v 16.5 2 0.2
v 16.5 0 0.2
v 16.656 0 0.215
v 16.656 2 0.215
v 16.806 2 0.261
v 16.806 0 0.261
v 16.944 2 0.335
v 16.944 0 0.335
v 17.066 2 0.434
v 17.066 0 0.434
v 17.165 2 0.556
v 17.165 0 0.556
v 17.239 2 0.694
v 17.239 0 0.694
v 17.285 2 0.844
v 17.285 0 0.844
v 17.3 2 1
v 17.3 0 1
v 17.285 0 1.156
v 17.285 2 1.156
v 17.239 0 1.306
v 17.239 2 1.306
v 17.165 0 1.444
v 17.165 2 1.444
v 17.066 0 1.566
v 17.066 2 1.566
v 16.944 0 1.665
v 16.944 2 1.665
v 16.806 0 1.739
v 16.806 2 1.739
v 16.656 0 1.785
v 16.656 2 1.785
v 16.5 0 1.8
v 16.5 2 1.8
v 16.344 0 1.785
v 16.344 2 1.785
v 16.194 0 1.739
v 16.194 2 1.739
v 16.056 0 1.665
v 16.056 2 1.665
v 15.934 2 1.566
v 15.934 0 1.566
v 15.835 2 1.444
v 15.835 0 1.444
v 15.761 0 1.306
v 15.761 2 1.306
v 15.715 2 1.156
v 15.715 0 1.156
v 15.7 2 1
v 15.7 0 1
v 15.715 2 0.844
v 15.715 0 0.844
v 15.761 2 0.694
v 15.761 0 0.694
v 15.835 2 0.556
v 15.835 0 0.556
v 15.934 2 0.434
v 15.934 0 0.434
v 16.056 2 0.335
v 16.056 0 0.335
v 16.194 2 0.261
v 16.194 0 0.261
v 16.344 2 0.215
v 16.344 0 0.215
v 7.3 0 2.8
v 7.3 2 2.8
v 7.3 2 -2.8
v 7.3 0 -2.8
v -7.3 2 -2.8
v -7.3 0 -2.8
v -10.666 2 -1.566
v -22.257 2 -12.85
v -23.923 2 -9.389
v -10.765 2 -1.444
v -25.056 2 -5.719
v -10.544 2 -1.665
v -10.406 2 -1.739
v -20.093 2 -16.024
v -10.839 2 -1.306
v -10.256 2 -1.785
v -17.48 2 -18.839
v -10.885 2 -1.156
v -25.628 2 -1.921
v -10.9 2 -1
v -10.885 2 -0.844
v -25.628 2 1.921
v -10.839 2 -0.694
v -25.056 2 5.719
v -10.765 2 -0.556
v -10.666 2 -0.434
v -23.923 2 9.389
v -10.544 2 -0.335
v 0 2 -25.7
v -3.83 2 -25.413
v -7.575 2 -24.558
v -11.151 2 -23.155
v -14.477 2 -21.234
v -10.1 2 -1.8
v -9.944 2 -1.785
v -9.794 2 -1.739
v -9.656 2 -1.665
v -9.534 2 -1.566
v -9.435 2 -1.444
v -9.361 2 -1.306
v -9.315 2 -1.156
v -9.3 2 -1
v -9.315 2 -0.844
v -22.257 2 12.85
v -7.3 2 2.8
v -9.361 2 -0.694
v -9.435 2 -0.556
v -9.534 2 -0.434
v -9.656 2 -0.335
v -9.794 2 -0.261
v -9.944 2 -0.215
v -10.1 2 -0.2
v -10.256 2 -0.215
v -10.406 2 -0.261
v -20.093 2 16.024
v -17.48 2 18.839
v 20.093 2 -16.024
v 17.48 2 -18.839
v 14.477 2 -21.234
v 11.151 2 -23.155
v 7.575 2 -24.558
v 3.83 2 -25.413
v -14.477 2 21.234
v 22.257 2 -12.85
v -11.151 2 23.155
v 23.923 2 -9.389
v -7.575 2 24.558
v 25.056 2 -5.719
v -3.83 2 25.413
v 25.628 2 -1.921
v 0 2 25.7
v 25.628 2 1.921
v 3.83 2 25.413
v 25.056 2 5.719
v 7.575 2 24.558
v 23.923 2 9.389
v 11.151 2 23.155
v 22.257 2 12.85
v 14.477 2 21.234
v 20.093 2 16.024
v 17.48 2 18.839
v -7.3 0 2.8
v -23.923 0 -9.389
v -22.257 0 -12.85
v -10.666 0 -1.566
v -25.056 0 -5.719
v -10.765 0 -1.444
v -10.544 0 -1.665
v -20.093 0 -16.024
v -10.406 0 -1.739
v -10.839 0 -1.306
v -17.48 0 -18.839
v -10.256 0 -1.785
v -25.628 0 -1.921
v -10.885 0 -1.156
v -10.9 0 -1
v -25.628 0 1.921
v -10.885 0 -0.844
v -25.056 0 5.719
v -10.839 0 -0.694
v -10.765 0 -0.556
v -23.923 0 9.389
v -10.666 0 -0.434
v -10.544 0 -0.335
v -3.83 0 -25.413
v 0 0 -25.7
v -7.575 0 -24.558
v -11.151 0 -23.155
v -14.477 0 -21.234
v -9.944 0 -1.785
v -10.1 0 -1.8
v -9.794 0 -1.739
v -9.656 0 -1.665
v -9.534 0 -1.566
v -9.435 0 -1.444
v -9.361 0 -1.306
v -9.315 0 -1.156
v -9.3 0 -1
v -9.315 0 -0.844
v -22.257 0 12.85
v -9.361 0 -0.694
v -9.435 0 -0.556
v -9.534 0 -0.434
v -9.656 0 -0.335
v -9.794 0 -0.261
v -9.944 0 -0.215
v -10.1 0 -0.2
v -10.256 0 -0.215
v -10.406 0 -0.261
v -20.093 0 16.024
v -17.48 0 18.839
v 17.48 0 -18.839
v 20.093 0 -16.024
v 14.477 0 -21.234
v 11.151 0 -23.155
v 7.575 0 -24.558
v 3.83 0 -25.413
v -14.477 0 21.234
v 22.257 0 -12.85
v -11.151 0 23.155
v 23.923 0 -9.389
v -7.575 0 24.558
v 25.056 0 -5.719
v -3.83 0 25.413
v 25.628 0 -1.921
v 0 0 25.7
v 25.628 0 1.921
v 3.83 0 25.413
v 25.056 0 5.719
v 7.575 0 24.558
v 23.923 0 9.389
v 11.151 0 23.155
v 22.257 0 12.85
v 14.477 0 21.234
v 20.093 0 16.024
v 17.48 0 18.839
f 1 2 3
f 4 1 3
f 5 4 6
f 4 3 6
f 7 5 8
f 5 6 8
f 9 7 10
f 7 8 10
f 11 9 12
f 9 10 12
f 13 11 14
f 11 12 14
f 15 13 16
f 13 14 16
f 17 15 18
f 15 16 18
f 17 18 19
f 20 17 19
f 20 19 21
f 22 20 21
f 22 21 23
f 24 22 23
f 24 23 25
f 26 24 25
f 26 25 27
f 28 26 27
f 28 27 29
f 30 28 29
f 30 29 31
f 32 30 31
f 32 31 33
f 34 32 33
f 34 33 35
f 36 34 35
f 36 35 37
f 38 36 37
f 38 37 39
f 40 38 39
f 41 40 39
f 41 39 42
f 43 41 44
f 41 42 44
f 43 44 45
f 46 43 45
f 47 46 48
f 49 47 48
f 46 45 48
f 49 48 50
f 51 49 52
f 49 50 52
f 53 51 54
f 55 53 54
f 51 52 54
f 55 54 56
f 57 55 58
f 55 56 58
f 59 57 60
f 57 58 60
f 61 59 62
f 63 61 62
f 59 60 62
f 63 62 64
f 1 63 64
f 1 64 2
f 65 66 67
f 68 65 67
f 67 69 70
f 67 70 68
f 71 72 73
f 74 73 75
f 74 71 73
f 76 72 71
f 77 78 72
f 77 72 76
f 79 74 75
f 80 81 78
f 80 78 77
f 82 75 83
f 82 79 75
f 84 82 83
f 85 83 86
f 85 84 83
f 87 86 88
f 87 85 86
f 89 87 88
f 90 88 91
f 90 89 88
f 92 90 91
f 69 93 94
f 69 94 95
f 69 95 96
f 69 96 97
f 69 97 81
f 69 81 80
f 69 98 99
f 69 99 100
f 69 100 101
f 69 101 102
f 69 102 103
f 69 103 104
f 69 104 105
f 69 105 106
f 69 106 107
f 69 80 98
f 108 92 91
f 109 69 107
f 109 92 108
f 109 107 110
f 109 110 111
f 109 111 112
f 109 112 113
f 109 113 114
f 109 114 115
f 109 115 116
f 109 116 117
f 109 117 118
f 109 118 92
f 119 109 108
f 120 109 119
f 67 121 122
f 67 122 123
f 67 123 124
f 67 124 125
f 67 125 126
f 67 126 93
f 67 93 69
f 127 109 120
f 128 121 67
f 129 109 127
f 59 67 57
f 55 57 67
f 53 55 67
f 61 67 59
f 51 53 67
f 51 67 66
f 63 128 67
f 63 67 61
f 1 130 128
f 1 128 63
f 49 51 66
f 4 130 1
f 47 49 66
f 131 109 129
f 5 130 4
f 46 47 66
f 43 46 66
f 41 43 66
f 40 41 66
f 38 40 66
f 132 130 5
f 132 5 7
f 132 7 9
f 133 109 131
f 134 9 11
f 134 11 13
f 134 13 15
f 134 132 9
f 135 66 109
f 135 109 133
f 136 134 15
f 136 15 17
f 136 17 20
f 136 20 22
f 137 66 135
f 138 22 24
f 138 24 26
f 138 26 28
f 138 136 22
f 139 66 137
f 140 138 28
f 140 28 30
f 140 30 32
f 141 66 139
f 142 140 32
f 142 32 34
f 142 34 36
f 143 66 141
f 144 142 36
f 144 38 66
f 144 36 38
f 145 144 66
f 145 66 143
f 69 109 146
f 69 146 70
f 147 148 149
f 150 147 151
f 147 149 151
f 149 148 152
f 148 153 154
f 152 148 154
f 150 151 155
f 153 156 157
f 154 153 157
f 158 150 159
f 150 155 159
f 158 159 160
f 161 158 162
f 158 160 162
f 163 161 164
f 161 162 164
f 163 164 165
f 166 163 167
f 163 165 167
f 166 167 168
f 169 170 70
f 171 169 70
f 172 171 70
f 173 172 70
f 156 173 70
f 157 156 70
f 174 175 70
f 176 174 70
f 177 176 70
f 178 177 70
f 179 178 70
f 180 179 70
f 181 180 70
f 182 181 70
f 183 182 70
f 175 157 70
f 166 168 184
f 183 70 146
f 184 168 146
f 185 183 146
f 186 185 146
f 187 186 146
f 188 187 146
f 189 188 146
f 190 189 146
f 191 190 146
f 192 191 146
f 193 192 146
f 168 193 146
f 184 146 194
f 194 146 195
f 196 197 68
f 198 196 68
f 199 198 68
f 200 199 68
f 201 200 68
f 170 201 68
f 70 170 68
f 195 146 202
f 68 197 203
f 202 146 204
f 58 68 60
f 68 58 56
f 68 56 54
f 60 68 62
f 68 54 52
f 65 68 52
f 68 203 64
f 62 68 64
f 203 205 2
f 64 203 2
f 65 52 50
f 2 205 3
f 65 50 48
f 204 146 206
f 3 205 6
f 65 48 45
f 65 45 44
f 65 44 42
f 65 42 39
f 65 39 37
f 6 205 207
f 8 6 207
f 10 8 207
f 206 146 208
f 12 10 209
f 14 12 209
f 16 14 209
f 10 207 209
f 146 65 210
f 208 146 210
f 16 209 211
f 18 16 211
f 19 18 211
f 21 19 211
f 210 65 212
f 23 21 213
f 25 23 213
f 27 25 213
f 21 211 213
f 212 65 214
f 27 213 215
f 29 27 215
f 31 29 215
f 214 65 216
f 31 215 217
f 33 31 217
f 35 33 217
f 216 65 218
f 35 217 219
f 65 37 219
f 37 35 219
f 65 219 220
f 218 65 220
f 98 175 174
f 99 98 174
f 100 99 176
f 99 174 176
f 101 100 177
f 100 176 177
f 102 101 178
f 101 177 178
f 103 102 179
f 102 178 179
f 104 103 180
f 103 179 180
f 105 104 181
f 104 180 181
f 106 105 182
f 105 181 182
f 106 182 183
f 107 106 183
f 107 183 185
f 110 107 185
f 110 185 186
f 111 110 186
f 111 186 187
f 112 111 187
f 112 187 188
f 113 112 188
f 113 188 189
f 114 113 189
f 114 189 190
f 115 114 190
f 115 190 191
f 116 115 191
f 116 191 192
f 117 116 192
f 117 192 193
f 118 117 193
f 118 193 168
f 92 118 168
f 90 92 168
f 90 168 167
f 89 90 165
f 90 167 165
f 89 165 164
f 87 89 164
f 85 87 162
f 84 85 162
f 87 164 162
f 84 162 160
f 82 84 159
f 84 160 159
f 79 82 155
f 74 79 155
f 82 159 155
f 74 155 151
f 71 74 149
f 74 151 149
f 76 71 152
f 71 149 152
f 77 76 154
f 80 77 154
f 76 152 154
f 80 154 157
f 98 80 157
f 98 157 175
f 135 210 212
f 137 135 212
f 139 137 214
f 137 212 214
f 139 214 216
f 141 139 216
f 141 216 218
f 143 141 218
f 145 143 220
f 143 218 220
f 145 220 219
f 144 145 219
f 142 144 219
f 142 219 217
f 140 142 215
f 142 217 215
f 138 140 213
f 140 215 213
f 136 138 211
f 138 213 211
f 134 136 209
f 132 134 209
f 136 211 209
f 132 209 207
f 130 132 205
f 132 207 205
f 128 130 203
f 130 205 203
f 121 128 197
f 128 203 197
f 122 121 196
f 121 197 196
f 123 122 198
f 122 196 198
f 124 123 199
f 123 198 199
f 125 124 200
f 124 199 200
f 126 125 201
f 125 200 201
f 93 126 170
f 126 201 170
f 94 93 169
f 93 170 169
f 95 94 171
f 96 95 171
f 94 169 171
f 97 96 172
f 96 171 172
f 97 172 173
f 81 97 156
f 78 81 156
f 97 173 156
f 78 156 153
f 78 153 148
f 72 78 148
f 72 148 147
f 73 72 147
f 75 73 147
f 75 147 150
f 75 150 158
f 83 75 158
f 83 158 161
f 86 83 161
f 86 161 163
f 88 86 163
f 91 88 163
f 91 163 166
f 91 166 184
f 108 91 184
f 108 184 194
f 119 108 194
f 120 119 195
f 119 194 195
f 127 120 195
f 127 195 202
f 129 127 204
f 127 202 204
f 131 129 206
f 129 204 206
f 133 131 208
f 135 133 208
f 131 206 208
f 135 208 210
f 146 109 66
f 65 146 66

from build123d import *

# Parameters (mm, degrees)
SKETCH2_R                  = 25.7
BOSS_EXTRUDE1_DEPTH        = 2
SKETCH3_W                  = 14.6
SKETCH3_H                  = 5.6
CUT_EXTRUDE1_DEPTH         = 37.400274724
F_1_6_1_6_DIAMETER_HOLE1_D = 1.6


with BuildPart() as part:
    # Sketch2 → Boss-Extrude1 (new body)
    with BuildSketch(Plane(origin=(0, 0, 0), x_dir=(1, 0, 0), z_dir=(0, 1, 0))):
        with Locations(Location((0, 0, 0), (0, 0, 270))):
            Circle(SKETCH2_R)
    extrude(amount=BOSS_EXTRUDE1_DEPTH)

    # Sketch3 → Cut-Extrude1 (cut, through all)
    with BuildSketch(Plane(origin=(0, 2, 0), x_dir=(1, 0, 0), z_dir=(0, 1, 0))):
        Rectangle(SKETCH3_W, SKETCH3_H)
    extrude(amount=-CUT_EXTRUDE1_DEPTH, mode=Mode.SUBTRACT)

    # Ø1.6 (1.6) Diameter Hole1 (through all)
    with Locations(Plane(origin=(-10.1, 2, -1), x_dir=(0, 0, 1), z_dir=(0, 1, 0))):
        with Locations((0, 0), (2, 26.6)):
            Hole(F_1_6_1_6_DIAMETER_HOLE1_D / 2)


solid = part.part
